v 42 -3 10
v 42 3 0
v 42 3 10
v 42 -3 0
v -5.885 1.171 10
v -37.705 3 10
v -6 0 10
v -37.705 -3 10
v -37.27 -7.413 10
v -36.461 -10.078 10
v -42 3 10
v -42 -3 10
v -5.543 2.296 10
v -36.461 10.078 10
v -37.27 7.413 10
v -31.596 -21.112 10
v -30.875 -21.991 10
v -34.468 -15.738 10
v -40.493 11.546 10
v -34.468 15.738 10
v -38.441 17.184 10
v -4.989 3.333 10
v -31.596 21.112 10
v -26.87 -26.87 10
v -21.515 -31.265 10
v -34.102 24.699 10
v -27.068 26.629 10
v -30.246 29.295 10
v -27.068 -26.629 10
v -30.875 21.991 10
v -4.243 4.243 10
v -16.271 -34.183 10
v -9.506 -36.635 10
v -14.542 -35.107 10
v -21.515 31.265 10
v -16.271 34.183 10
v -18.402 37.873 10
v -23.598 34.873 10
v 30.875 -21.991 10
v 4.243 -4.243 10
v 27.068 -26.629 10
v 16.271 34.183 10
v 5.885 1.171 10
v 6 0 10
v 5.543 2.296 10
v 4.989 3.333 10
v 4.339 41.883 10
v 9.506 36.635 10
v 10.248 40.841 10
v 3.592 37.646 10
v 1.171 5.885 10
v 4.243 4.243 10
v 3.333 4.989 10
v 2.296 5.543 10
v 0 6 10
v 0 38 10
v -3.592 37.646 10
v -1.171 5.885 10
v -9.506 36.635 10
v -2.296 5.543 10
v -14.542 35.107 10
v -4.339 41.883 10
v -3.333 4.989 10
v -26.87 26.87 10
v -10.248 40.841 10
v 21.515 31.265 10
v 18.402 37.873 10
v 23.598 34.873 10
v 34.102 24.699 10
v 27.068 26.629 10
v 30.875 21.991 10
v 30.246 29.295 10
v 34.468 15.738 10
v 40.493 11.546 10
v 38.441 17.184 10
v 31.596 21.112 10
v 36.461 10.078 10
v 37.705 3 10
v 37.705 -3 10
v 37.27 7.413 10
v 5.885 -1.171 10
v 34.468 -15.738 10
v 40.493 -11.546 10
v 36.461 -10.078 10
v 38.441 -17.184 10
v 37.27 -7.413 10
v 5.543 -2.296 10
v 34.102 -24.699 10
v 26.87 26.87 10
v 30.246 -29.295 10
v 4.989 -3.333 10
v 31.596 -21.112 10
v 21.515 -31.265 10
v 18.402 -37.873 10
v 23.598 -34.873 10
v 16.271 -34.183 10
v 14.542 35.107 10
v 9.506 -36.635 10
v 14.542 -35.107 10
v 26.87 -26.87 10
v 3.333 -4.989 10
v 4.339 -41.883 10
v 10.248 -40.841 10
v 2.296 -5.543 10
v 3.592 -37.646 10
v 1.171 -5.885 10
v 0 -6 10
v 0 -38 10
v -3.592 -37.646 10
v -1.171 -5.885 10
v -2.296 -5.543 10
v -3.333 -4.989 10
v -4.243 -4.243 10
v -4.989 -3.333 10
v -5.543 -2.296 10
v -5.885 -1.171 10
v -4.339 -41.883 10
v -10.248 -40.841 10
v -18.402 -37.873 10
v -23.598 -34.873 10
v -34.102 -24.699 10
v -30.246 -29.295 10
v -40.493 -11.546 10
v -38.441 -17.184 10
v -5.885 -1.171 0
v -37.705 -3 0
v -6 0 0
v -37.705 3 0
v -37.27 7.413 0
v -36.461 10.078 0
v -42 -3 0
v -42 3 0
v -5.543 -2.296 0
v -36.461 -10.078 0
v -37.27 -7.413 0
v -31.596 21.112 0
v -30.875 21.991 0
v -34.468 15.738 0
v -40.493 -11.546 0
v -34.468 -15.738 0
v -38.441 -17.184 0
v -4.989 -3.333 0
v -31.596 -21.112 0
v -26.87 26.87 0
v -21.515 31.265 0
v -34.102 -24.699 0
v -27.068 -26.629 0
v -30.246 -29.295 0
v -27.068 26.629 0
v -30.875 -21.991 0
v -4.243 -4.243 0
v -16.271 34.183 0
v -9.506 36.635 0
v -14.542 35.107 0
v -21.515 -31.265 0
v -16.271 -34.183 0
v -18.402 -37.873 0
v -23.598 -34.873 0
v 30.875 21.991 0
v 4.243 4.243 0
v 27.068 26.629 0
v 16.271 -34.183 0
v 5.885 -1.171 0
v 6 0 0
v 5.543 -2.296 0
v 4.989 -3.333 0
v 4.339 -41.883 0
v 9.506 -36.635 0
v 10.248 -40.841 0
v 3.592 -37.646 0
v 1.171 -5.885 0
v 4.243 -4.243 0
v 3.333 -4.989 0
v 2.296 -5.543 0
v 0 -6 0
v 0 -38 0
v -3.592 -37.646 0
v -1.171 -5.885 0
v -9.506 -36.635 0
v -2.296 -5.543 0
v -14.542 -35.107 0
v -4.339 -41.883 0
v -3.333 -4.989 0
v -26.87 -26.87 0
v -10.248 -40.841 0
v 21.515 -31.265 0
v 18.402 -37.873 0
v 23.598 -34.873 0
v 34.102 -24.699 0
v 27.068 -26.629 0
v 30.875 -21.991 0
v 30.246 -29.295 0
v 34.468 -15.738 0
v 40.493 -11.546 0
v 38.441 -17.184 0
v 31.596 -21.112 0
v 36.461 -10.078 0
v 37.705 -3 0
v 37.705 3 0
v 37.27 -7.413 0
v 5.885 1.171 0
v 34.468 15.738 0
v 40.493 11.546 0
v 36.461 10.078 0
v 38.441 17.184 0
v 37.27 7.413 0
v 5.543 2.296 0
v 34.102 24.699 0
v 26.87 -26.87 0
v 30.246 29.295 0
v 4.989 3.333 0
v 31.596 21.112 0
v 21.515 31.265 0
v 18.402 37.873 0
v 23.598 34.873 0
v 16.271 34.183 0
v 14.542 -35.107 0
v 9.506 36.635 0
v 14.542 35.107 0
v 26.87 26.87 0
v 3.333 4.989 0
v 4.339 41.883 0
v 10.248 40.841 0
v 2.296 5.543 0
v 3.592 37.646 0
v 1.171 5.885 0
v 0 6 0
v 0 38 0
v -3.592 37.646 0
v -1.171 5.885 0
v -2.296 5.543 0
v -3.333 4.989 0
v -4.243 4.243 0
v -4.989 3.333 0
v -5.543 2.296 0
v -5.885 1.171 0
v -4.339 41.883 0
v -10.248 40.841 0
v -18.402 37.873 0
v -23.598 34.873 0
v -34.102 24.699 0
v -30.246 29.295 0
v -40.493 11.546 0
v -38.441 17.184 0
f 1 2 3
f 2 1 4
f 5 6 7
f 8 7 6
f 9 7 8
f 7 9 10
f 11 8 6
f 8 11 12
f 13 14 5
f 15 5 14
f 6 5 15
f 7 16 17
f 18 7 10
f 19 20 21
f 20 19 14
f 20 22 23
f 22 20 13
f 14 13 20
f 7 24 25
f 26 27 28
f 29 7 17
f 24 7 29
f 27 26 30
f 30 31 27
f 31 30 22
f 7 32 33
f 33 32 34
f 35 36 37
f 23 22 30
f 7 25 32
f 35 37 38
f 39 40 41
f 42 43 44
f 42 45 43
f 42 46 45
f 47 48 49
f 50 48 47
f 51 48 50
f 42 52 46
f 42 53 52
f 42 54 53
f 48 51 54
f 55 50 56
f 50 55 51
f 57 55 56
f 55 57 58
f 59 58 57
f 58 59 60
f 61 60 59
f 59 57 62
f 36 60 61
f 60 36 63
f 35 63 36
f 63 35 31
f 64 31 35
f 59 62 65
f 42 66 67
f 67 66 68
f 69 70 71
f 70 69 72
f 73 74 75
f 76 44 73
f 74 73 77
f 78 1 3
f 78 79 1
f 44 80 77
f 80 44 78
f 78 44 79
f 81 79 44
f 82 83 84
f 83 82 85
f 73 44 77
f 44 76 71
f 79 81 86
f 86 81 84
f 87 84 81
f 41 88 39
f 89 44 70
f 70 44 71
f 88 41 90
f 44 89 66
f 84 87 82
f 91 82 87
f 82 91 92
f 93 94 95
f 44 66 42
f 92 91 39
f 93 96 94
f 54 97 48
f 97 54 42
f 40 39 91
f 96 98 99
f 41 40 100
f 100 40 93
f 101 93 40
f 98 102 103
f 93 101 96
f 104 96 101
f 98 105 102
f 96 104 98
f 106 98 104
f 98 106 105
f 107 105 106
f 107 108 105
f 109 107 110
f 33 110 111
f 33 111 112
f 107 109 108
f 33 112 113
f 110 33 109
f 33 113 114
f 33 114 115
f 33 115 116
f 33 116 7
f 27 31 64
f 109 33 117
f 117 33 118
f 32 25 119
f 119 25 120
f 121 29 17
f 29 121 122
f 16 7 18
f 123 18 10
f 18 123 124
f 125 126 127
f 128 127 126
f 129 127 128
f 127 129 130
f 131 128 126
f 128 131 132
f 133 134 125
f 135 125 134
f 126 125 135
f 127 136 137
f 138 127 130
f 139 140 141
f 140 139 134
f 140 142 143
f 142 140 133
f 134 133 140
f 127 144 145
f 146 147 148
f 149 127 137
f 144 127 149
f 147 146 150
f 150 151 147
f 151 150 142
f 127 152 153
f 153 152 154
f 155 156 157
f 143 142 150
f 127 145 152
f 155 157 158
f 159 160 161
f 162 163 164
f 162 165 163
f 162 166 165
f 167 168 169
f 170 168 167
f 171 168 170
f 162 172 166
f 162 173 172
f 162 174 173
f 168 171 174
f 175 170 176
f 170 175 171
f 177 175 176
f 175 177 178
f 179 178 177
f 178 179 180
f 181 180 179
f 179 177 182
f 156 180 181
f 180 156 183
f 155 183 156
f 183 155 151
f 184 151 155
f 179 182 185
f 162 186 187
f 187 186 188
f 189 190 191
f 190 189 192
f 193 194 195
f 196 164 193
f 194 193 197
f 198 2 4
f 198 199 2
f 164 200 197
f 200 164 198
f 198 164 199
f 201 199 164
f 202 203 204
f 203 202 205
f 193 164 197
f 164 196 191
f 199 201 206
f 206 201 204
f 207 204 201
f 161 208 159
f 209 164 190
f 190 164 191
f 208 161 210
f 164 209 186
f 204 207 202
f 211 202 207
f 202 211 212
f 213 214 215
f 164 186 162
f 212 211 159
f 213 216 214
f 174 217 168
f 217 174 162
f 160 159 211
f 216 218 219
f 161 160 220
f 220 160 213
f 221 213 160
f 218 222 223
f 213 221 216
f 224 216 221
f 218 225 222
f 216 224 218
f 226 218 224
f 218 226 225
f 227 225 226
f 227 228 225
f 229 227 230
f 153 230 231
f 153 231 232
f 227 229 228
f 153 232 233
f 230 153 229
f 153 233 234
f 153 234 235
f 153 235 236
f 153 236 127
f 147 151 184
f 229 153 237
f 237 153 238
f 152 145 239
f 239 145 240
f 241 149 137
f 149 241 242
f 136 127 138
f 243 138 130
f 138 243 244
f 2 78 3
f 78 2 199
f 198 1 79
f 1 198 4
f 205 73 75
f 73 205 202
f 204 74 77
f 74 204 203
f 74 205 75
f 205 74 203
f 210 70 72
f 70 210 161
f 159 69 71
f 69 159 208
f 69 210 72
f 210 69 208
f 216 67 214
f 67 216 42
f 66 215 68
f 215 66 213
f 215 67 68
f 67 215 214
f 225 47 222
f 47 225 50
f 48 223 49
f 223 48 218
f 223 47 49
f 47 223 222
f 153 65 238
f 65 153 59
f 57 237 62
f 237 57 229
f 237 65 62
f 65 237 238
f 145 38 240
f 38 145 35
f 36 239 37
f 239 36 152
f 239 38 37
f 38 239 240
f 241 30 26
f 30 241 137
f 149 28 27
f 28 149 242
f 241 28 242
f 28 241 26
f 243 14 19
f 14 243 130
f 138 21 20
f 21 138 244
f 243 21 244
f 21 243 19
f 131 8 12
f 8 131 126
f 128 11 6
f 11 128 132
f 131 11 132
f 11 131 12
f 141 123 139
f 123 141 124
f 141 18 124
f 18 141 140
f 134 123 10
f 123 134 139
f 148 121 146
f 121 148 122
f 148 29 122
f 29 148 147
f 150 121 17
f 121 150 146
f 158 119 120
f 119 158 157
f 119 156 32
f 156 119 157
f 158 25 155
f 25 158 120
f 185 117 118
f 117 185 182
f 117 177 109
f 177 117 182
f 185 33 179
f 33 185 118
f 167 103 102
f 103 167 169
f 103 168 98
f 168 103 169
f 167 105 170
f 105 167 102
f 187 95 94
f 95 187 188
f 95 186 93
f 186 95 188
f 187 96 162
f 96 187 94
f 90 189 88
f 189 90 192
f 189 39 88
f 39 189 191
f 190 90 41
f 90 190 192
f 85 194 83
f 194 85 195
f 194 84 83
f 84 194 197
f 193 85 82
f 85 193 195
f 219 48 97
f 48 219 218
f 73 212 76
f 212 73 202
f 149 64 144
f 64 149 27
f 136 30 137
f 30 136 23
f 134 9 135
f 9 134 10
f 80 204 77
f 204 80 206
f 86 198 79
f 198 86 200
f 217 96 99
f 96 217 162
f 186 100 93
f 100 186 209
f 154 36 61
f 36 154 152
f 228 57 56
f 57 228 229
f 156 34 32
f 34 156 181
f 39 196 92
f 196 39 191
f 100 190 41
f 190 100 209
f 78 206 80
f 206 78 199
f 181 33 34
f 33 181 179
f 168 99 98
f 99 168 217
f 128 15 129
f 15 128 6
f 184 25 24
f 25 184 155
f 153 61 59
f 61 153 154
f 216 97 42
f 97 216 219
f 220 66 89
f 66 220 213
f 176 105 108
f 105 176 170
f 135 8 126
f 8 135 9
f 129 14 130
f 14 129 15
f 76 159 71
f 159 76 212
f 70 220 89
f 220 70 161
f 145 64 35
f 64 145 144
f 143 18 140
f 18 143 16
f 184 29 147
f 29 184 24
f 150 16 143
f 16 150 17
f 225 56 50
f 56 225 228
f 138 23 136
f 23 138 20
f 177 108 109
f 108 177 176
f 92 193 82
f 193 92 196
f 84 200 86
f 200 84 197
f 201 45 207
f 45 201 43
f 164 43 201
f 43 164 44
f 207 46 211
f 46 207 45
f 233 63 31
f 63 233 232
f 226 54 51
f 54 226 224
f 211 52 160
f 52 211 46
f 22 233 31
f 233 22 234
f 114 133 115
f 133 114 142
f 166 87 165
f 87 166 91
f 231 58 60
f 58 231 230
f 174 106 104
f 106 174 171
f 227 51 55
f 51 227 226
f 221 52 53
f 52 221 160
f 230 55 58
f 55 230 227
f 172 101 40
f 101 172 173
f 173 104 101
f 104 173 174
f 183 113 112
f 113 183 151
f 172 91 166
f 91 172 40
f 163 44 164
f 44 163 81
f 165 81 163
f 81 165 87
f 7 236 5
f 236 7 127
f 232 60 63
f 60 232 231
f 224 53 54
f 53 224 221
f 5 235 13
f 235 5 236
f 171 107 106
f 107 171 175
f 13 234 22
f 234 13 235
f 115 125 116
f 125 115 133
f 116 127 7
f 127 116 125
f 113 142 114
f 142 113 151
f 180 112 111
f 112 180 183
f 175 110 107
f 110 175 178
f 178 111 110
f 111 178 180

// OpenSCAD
$fn = 32;

// ----------------------------------------------------------------------
// Spur blank: bored gear blank
// ----------------------------------------------------------------------

// --- parameters (mm) ---
disc_r = 38;              // blank root radius
disc_t = 10;              // blank thickness
n_teeth = 18;             // stub tooth count
tooth_w = 6;              // tooth width at the root
tooth_h = 4;              // tooth height above the root
bore_r = 6;               // central bore radius

out_r = disc_r + tooth_h;  // tip radius
bbox_x = 84.0;  // measured width over the teeth
bbox_y = 83.77;  // measured depth over the teeth

difference() {
union() {
  cylinder(r = disc_r, h = disc_t);
  for (i = [0 : n_teeth - 1])
    rotate([0, 0, i * 360 / n_teeth])
      translate([disc_r - 1, -tooth_w / 2, 0])
        cube([tooth_h + 1, tooth_w, disc_t]);
}
  translate([0, 0, -1]) cylinder(r = bore_r, h = disc_t + 2);
}
